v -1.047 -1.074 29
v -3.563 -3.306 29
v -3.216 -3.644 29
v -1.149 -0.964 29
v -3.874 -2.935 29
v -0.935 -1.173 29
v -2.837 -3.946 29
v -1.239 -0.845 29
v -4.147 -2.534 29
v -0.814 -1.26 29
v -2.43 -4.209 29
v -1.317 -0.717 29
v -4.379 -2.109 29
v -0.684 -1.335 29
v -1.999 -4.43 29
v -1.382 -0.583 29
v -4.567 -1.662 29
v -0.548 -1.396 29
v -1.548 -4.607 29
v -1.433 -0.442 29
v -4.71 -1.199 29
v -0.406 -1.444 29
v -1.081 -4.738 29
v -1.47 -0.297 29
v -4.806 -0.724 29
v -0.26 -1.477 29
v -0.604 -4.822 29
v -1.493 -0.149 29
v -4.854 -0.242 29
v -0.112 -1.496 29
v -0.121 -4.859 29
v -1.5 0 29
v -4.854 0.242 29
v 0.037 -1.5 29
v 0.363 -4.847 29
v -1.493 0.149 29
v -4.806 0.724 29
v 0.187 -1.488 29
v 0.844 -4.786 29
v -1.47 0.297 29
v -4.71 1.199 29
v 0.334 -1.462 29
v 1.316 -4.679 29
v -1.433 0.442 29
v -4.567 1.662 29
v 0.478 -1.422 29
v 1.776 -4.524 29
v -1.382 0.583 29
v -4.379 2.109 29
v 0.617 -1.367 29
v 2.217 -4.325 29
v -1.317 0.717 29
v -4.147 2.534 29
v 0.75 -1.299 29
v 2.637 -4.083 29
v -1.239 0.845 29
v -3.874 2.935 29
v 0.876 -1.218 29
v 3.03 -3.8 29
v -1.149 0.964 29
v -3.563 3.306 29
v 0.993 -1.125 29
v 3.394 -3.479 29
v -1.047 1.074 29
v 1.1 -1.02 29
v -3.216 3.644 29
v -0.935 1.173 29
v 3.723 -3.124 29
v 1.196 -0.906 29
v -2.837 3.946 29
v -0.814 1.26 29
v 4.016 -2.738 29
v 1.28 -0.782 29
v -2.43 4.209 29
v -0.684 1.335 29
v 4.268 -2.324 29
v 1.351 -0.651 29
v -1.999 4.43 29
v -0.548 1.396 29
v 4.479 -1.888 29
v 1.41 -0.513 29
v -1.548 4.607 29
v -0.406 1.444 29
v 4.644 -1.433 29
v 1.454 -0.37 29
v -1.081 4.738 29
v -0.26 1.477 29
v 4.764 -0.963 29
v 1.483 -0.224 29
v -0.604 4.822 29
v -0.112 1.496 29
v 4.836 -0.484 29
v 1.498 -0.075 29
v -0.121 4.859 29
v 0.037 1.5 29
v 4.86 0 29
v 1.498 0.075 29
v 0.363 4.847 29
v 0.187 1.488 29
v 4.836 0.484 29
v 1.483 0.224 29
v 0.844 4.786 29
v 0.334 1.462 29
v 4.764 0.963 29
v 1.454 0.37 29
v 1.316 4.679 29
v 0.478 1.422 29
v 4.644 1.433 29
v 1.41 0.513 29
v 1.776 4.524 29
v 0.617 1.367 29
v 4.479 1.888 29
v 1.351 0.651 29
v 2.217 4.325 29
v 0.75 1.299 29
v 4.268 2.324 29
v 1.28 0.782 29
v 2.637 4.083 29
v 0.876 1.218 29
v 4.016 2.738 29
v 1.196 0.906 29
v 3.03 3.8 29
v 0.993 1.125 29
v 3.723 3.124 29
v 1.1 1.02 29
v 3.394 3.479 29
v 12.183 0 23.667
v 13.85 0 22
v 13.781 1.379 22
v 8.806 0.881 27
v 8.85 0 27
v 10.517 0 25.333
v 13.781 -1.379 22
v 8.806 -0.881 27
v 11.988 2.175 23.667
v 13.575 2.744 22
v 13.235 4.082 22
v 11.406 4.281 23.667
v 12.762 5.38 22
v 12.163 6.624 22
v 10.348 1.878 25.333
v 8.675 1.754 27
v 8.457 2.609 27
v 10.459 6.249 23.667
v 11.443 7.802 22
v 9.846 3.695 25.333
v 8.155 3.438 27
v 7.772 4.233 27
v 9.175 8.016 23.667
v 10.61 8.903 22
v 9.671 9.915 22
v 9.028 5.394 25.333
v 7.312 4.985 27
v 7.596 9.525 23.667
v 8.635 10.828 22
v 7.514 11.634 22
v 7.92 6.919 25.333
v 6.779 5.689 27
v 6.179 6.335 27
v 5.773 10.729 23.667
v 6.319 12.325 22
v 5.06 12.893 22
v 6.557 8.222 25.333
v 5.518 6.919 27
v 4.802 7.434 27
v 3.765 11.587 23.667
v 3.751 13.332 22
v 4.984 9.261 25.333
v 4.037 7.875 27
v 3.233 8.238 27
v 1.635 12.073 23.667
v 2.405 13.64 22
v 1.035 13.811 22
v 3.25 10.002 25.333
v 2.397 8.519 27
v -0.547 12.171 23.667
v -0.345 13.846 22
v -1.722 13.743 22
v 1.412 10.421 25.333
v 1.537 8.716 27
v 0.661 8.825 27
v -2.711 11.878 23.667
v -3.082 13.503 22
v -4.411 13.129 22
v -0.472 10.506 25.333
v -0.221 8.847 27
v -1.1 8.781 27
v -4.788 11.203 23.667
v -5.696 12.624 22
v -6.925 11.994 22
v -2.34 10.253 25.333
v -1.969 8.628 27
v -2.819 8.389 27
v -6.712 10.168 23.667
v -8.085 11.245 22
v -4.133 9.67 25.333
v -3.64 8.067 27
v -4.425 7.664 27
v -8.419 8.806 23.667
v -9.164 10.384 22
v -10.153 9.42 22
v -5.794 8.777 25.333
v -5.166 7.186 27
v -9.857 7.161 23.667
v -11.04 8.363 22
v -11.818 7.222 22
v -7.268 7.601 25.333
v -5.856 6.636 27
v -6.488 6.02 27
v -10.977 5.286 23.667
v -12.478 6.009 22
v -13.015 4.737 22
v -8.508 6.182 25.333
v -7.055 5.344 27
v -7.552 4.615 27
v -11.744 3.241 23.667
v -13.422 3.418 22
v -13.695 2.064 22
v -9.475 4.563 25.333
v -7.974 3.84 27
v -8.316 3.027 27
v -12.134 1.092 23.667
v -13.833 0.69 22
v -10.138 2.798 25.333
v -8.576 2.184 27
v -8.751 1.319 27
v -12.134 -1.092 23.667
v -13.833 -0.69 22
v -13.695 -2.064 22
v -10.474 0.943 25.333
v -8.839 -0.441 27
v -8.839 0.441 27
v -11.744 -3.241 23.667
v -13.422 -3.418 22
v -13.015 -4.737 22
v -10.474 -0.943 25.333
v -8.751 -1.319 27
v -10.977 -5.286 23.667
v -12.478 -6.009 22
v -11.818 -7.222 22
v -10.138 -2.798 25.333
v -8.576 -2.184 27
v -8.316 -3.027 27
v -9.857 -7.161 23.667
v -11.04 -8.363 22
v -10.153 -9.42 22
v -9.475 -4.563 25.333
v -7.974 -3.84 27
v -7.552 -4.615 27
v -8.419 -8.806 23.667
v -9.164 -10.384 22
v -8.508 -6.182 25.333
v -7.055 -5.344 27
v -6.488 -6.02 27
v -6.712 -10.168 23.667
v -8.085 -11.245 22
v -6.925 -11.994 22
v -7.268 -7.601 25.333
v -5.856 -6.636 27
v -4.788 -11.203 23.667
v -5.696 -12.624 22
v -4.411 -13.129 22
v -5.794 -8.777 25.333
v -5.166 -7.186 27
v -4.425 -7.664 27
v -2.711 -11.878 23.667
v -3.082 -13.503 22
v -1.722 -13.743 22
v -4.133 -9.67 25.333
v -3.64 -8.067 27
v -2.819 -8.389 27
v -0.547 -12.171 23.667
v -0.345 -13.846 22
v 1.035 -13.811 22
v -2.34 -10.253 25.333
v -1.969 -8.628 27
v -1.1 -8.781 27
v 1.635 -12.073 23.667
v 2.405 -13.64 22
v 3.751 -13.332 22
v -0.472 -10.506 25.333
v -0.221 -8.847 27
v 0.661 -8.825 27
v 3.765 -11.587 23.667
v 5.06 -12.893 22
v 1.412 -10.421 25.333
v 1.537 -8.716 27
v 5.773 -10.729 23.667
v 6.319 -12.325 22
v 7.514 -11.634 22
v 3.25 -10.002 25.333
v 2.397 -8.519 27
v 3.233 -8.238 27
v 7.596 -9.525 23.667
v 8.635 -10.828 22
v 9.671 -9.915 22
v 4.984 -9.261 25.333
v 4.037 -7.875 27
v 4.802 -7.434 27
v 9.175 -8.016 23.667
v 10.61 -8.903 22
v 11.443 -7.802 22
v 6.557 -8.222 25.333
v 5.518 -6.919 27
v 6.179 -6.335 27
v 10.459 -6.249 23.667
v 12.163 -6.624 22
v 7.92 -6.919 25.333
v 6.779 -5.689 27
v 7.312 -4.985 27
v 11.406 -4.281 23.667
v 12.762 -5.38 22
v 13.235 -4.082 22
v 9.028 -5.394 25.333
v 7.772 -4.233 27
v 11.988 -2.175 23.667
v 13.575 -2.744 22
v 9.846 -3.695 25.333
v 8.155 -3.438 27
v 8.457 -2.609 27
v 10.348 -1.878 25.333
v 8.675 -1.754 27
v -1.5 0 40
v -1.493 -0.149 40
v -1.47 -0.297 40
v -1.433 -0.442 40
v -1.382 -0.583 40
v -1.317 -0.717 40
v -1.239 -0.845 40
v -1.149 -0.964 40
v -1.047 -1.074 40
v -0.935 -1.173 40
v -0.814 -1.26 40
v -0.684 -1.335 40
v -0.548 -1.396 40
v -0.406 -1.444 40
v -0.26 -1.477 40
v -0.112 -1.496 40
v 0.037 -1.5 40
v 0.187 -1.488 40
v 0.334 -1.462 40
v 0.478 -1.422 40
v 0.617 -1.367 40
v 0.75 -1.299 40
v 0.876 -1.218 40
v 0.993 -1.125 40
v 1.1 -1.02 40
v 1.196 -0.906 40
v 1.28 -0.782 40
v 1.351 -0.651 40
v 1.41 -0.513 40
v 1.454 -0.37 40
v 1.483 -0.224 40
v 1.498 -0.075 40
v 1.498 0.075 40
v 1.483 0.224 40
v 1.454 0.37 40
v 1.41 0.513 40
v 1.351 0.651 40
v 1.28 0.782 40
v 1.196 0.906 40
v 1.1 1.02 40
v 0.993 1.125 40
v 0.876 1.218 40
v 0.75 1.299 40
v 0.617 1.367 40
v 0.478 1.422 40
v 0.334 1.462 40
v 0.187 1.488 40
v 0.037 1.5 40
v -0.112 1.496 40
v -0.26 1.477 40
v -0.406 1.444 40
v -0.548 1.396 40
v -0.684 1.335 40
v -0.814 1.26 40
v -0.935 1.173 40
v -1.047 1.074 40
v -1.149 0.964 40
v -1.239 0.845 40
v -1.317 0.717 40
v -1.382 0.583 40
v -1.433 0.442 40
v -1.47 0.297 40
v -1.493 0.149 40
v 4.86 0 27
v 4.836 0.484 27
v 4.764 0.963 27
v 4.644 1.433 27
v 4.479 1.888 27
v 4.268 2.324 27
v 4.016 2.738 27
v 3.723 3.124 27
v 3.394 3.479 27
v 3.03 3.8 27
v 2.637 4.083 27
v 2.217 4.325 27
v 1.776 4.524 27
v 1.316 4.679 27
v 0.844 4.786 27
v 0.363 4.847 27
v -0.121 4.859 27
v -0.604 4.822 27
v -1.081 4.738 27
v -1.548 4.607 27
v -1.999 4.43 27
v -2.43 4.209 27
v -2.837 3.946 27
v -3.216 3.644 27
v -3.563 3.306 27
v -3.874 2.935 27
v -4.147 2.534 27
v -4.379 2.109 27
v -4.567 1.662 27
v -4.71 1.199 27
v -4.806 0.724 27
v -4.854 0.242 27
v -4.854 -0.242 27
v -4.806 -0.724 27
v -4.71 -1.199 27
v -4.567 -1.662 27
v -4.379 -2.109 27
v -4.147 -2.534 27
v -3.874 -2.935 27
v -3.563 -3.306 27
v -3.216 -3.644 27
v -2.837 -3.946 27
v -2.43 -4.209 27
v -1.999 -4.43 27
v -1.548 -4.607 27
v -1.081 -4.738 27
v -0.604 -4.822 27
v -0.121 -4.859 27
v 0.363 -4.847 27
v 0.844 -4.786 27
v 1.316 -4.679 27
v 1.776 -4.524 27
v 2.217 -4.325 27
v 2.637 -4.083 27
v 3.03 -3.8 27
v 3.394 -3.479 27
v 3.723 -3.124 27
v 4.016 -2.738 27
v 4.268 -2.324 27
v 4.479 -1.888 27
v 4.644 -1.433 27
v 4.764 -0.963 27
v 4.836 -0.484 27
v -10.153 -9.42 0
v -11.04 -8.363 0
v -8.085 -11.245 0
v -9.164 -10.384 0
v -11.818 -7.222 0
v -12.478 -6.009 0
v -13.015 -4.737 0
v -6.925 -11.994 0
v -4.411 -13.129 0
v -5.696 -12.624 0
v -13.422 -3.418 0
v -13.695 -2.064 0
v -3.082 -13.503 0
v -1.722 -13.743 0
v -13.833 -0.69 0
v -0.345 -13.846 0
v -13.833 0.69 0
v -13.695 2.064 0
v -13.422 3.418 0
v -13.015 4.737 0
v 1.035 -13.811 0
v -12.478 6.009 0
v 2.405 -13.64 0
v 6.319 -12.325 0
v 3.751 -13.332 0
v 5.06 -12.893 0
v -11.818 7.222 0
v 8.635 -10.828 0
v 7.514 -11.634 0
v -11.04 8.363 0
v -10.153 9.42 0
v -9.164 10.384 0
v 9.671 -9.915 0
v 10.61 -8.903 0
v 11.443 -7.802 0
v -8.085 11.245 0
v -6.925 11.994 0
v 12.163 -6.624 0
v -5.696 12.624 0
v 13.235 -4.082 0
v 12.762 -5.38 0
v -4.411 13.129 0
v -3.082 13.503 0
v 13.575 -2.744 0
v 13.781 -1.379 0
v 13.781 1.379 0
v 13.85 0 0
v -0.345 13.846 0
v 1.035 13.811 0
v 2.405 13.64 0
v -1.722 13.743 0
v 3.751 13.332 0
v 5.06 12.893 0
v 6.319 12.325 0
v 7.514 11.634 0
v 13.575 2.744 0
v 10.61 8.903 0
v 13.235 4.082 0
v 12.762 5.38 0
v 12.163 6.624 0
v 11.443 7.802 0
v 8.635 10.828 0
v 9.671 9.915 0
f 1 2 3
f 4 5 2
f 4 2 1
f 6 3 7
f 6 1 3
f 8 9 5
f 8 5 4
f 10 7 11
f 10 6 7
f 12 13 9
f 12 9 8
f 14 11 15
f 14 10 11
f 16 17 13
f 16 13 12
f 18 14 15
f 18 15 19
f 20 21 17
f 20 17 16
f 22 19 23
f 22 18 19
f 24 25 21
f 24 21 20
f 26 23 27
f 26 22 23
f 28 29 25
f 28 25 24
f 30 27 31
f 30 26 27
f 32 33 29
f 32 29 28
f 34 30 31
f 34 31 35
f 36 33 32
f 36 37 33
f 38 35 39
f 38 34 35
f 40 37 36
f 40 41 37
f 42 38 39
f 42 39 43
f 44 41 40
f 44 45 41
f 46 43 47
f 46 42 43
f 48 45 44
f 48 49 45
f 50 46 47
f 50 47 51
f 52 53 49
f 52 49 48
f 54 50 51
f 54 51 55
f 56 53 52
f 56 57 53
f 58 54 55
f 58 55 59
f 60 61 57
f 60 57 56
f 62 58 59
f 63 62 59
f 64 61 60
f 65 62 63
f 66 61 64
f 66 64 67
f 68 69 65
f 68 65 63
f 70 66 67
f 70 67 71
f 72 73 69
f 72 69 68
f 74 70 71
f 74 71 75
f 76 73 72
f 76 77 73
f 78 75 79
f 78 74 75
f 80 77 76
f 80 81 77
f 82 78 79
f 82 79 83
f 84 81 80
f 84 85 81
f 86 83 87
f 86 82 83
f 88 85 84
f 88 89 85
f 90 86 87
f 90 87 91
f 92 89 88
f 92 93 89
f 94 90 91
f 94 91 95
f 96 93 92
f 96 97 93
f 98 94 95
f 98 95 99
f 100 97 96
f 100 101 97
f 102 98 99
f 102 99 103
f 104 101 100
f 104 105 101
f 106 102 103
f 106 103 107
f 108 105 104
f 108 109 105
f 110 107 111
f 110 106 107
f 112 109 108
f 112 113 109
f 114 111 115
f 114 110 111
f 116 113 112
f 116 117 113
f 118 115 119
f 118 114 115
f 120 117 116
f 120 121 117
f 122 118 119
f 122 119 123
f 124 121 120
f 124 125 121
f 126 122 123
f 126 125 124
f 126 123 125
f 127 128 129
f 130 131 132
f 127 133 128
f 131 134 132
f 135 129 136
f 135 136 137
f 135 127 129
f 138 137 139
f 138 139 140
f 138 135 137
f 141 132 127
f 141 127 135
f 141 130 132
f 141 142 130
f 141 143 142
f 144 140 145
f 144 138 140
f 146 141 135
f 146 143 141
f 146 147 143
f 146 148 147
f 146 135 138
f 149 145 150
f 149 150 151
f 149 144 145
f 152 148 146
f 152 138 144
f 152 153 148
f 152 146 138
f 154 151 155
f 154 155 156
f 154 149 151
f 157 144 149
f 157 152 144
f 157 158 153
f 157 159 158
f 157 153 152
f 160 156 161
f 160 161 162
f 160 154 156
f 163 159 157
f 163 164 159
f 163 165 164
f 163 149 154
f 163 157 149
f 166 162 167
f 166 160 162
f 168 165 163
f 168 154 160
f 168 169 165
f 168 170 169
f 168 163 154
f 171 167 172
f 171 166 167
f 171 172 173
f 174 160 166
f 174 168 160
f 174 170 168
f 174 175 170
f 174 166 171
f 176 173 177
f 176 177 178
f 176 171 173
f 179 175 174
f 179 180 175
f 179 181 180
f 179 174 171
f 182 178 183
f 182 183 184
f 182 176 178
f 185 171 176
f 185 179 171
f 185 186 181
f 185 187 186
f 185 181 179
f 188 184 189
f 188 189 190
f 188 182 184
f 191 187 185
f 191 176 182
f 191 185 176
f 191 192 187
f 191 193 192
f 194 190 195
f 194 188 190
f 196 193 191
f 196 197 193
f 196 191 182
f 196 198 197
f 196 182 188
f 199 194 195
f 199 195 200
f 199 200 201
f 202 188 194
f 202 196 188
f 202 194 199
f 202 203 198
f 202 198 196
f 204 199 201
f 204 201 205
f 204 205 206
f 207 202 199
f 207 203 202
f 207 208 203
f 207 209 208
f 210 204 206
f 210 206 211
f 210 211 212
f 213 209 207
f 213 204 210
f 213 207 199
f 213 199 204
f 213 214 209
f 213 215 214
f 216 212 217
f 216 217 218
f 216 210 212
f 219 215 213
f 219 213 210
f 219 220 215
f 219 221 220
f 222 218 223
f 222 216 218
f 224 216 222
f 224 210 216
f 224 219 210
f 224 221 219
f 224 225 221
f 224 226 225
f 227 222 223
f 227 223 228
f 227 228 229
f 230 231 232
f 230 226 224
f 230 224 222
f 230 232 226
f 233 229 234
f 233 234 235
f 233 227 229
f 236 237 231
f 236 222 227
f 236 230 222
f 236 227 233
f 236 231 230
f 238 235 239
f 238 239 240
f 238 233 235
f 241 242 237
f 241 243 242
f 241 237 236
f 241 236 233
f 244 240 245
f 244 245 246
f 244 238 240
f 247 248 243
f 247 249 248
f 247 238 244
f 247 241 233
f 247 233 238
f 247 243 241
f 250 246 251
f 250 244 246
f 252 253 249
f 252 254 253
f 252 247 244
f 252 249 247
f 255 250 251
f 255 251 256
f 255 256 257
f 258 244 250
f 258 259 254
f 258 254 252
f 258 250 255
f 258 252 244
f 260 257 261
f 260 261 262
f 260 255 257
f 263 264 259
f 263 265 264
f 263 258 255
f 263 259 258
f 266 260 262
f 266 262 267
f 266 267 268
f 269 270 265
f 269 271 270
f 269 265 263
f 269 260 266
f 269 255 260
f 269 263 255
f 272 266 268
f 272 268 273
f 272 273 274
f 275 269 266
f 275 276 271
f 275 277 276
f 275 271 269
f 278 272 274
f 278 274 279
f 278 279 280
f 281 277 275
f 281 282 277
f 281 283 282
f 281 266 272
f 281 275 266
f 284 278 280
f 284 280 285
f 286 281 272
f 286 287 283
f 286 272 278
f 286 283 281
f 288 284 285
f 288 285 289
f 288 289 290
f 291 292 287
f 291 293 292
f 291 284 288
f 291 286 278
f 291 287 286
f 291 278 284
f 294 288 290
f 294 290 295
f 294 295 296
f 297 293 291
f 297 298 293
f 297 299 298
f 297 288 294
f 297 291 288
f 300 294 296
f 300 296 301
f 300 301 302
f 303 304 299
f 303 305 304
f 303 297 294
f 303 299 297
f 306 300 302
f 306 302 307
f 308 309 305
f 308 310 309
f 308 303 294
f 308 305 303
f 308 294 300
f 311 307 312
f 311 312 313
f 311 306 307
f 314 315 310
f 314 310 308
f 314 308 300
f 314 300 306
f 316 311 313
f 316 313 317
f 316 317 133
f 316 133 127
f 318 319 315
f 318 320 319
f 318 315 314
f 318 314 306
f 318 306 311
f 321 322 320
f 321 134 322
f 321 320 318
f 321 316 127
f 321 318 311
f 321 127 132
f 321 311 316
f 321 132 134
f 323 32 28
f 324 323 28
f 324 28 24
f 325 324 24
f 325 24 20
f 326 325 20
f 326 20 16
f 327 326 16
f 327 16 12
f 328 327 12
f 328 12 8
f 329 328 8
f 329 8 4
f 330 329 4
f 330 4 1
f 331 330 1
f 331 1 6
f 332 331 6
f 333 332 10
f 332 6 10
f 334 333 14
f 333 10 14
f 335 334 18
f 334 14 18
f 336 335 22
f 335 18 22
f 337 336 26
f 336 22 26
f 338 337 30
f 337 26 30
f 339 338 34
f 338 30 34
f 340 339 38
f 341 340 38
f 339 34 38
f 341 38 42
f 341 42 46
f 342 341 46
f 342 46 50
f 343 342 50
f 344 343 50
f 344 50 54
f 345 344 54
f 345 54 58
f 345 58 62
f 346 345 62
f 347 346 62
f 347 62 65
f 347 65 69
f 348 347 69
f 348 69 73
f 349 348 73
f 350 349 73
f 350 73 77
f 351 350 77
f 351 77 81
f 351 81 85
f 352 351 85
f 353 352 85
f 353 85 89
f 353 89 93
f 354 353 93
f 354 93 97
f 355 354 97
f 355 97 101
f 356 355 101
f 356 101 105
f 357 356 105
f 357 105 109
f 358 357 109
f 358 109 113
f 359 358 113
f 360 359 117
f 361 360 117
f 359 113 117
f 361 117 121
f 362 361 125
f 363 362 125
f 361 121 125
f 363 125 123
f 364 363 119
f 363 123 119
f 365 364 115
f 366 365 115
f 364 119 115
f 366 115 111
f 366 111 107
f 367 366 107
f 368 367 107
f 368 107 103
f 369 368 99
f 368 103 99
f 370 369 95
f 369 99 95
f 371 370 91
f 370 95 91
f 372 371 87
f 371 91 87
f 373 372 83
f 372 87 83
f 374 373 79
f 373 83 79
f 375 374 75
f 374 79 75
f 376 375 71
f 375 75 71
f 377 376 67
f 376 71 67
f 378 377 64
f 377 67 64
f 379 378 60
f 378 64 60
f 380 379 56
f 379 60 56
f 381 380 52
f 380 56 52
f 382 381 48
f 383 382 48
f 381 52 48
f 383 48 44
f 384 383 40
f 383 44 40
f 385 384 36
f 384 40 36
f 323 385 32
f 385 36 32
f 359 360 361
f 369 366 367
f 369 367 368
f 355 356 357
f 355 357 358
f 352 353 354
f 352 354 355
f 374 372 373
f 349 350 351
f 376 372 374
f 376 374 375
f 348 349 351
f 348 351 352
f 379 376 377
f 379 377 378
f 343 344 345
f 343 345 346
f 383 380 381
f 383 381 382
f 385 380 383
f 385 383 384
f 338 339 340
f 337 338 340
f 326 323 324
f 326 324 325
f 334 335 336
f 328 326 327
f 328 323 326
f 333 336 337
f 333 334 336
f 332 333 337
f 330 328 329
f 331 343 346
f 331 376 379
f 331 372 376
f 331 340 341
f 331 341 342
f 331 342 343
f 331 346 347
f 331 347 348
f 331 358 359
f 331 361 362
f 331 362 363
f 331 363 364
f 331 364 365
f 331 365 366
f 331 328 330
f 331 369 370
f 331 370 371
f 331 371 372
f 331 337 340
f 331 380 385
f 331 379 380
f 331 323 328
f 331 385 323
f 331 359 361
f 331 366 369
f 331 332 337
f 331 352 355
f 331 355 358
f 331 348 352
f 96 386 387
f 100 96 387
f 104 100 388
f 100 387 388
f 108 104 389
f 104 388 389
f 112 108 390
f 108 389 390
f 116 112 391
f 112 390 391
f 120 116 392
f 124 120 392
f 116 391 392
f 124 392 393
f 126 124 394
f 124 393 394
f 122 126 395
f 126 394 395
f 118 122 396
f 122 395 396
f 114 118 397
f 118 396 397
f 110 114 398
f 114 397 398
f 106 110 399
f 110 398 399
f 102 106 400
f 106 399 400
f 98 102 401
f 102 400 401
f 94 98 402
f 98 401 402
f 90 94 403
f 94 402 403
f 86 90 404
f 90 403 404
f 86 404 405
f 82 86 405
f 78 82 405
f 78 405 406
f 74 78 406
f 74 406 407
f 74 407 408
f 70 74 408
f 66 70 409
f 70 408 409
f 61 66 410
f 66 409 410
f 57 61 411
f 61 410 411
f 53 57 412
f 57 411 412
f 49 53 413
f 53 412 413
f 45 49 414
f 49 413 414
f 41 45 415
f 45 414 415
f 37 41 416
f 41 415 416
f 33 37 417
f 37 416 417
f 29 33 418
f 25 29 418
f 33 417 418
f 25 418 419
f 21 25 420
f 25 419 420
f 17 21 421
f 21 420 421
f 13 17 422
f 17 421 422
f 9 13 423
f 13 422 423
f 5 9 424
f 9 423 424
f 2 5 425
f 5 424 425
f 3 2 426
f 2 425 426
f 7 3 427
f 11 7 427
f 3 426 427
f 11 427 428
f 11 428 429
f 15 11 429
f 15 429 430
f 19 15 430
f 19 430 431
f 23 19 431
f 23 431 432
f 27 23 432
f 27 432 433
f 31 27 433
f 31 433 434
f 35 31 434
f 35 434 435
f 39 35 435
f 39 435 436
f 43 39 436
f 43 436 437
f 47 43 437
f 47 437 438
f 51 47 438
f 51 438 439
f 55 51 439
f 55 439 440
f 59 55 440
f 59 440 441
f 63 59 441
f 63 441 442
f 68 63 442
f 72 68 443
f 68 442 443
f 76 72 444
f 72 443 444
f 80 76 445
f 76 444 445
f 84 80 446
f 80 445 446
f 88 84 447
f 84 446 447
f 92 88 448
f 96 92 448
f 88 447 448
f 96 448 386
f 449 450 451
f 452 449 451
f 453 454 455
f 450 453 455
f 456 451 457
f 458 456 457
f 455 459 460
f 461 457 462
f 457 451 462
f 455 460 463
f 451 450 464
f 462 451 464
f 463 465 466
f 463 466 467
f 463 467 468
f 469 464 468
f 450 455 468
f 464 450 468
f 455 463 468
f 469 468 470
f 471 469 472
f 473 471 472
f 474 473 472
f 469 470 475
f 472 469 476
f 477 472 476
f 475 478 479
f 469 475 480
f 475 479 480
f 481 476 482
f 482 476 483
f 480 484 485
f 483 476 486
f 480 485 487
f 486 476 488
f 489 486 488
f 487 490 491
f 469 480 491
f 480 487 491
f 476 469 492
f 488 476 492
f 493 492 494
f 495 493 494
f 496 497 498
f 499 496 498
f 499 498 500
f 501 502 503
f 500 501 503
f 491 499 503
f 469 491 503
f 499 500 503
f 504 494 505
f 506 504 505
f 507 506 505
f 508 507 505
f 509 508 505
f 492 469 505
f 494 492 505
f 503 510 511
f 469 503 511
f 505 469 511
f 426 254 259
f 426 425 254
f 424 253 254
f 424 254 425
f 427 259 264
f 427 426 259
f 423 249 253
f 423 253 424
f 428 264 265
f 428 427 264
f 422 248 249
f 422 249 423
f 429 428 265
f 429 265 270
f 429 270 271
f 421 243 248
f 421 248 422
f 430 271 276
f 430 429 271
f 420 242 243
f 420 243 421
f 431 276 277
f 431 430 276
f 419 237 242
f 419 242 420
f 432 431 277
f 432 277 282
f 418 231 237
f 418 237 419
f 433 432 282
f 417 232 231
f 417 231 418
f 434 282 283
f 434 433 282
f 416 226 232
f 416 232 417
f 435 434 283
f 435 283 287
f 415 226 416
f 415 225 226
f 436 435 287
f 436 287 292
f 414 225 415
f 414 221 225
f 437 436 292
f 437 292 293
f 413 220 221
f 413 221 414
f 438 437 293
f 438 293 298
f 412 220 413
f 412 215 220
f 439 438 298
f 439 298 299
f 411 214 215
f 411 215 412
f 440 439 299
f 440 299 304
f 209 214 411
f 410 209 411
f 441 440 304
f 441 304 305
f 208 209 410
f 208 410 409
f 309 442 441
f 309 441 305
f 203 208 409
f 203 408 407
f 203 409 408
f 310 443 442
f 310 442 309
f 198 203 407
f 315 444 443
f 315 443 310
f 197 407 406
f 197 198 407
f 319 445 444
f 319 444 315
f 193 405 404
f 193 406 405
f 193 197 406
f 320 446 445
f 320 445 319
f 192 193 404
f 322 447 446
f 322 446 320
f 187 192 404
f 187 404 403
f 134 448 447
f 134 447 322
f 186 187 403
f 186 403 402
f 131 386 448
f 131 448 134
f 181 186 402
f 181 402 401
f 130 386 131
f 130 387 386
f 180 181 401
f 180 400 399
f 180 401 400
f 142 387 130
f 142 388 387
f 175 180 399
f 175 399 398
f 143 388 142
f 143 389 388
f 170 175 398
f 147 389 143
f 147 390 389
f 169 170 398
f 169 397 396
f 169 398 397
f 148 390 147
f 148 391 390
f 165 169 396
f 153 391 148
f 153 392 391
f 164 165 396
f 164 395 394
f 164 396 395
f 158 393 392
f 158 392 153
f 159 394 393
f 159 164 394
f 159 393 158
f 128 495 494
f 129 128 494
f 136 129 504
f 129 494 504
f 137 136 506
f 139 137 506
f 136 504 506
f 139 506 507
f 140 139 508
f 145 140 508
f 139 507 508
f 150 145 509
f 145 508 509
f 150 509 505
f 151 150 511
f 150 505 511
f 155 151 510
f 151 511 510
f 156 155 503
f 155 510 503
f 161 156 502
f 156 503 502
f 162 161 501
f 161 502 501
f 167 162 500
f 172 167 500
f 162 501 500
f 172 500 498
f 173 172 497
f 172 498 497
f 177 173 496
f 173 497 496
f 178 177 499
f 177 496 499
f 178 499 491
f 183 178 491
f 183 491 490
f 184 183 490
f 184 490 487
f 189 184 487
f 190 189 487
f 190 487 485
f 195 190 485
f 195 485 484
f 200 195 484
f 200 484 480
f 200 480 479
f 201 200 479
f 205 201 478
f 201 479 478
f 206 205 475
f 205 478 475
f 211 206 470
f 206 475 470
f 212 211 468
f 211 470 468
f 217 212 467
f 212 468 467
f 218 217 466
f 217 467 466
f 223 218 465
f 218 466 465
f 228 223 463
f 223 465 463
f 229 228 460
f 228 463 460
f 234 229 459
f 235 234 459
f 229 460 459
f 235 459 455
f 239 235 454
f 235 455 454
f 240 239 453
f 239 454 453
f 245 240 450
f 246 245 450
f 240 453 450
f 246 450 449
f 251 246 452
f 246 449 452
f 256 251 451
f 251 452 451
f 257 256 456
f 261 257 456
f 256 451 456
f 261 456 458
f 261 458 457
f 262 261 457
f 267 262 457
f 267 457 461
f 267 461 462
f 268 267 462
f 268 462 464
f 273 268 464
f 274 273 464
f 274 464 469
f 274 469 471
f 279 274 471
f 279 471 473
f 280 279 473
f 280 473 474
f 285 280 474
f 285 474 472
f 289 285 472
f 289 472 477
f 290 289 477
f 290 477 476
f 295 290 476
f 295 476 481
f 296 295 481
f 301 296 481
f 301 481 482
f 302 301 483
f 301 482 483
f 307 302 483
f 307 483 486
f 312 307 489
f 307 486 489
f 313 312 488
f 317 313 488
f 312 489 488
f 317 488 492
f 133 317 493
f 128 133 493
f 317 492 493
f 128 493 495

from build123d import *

# Parameters (mm, degrees)
ESQUISSE1_R        = 13.85
BOSS_EXTRU_1_DEPTH = 27
CHANFREIN1_SIZE    = 5
ESQUISSE2_R        = 1.5
BOSS_EXTRU_2_DEPTH = 13
ESQUISSE3_R        = 4.860209202
BOSS_EXTRU_3_DEPTH = 2


with BuildPart() as part:
    # Esquisse1 → Boss.-Extru.1 (new body)
    with BuildSketch(Plane.XY):
        Circle(ESQUISSE1_R)
    extrude(amount=BOSS_EXTRU_1_DEPTH)

    # Chanfrein1
    chanfrein1_edges = [part.edges().sort_by_distance(p)[0] for p in [
        (-13.85, 0, 27),
    ]]
    chamfer(chanfrein1_edges, length=CHANFREIN1_SIZE)

    # Esquisse2 → Boss.-Extru.2 (add)
    with BuildSketch(Plane.XY.offset(27)):
        with Locations(Location((0, 0, 0), (0, 0, 180))):
            Circle(ESQUISSE2_R)
    extrude(amount=BOSS_EXTRU_2_DEPTH)

    # Esquisse3 → Boss.-Extru.3 (add)
    with BuildSketch(Plane.XY.offset(27)):
        Circle(ESQUISSE3_R)
    extrude(amount=BOSS_EXTRU_3_DEPTH)


solid = part.part
